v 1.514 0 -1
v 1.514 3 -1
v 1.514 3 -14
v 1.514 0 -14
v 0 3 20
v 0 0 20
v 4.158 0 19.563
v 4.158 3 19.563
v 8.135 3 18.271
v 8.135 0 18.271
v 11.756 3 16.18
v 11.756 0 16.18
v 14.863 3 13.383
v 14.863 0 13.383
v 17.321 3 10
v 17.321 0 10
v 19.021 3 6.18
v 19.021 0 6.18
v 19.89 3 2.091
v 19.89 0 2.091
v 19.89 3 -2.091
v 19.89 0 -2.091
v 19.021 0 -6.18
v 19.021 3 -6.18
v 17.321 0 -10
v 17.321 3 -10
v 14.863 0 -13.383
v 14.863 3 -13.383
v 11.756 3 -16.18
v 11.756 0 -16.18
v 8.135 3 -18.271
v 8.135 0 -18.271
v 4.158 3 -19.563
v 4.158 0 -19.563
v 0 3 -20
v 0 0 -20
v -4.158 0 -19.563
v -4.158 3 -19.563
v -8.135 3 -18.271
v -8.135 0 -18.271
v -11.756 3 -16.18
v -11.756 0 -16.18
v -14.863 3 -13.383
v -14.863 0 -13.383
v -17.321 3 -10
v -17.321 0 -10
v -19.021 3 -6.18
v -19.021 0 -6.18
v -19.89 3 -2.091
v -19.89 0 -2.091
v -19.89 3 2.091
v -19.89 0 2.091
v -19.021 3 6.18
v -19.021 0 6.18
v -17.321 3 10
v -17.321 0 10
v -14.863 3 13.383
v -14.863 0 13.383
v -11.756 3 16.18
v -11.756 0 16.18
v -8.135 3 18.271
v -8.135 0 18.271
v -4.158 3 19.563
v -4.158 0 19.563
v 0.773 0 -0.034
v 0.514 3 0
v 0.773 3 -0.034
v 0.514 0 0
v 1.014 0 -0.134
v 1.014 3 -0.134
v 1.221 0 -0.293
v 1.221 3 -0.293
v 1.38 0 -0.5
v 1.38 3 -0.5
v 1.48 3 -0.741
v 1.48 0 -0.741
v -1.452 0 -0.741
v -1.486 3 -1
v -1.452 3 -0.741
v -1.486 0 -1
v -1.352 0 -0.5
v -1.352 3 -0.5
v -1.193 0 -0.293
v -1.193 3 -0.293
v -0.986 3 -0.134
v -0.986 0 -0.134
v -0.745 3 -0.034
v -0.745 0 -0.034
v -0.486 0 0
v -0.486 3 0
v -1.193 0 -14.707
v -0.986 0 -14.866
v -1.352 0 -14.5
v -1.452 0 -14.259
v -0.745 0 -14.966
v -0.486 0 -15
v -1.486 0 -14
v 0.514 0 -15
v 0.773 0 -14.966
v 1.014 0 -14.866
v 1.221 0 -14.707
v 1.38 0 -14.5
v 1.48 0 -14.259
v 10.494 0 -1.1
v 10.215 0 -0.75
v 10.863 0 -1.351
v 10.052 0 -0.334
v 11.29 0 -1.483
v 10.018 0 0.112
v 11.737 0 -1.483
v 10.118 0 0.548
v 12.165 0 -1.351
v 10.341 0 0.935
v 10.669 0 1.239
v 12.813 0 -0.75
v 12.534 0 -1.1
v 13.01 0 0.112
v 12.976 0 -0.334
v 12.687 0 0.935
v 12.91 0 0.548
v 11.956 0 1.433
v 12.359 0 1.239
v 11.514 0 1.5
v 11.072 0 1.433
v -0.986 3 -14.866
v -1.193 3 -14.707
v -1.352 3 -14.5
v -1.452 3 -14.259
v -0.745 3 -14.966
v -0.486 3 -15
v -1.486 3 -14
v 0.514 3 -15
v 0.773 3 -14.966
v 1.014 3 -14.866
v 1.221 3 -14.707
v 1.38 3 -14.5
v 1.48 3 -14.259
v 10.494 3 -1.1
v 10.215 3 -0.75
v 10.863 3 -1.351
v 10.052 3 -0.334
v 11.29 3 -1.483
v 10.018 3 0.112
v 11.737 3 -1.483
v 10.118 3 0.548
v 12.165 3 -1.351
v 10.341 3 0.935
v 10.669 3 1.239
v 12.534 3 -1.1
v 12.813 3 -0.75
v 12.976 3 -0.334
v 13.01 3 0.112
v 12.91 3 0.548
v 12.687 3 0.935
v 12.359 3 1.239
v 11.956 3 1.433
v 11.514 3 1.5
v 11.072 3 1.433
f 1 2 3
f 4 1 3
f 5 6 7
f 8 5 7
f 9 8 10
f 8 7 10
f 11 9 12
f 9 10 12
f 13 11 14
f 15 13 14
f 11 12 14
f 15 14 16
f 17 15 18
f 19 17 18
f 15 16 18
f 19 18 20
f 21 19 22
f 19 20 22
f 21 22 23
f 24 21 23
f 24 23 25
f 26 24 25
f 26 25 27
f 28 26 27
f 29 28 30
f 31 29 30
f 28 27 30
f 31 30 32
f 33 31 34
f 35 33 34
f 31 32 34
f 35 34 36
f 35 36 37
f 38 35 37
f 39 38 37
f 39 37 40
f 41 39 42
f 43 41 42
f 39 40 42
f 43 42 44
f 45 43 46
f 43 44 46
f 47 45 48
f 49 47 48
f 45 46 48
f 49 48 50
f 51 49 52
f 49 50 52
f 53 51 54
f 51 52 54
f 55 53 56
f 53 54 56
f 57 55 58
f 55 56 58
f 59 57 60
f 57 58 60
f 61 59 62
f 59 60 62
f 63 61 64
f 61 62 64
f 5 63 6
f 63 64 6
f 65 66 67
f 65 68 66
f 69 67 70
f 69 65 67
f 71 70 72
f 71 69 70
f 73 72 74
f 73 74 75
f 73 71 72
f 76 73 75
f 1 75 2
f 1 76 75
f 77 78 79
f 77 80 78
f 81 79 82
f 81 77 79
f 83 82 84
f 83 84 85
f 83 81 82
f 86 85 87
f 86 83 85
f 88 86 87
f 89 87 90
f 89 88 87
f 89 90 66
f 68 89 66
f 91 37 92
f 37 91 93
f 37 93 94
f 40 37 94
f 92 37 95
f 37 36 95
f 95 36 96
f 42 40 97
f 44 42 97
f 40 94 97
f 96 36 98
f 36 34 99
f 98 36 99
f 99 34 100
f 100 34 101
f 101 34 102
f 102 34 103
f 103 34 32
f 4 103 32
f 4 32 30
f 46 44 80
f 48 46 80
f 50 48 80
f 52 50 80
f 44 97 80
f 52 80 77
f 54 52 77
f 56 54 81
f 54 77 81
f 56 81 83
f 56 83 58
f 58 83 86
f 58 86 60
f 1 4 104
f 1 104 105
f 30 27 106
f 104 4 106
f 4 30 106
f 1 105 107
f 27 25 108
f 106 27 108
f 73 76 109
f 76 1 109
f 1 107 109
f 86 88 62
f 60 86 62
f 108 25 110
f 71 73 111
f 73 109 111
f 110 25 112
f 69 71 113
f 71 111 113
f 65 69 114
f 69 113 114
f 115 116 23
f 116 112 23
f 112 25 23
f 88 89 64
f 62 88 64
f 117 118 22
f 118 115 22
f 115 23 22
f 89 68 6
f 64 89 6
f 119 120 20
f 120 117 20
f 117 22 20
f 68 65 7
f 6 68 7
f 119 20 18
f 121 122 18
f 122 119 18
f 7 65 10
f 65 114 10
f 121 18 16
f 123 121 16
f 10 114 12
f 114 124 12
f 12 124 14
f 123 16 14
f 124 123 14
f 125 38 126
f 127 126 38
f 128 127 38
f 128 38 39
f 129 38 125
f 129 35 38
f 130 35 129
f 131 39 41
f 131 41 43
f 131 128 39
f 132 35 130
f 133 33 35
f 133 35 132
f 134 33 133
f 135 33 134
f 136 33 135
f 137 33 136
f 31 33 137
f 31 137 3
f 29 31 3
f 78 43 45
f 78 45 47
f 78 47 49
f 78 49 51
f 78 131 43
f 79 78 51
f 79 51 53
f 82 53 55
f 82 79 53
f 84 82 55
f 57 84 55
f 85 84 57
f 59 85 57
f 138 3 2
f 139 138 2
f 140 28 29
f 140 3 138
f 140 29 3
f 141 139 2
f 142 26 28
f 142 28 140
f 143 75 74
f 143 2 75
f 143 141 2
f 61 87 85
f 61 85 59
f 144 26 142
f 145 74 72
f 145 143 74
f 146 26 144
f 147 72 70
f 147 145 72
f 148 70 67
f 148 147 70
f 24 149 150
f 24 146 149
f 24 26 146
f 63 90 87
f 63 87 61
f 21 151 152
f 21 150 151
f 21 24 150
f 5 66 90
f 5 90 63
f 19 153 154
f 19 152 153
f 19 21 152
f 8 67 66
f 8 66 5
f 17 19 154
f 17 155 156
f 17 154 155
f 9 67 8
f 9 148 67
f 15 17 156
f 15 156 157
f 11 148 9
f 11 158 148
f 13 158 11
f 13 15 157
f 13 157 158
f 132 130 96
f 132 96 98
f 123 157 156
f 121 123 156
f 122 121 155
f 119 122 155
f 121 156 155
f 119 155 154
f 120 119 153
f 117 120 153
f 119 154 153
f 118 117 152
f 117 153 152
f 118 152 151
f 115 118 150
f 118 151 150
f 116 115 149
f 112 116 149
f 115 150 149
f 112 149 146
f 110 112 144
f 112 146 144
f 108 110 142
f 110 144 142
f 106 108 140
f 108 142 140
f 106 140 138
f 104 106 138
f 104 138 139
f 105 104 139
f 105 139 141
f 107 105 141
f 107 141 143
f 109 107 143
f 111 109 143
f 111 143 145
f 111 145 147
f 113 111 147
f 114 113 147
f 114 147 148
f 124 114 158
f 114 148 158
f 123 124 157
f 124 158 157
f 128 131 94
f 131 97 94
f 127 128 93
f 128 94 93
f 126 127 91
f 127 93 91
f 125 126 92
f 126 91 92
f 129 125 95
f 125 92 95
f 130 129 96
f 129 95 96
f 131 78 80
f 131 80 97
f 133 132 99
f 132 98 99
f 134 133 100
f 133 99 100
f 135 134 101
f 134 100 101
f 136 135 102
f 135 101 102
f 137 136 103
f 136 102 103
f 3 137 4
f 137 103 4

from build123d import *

# Parameters (mm, degrees)
SKETCH1_R           = 20
BOSS_EXTRUDE1_DEPTH = 3
SKETCH2_W           = 3
SKETCH2_H           = 15
CUT_EXTRUDE1_DEPTH  = 3
SKETCH3_R           = 1.5
CUT_EXTRUDE2_DEPTH  = 3
FILLET1_R           = 1
FILLET2_R           = 1
FILLET3_R           = 1
FILLET4_R           = 1


with BuildPart() as part:
    # Sketch1 → Boss-Extrude1 (new body)
    with BuildSketch(Plane(origin=(0, 0, 0), x_dir=(1, 0, 0), z_dir=(0, 1, 0))):
        with Locations(Location((0, 0, 0), (0, 0, 270))):
            Circle(SKETCH1_R)
    extrude(amount=BOSS_EXTRUDE1_DEPTH)

    # Sketch2 → Cut-Extrude1 (cut)
    with BuildSketch(Plane(origin=(0, 3, 0), x_dir=(1, 0, 0), z_dir=(0, 1, 0))):
        with Locations((0.013912119, 7.5)):
            Rectangle(SKETCH2_W, SKETCH2_H)
    extrude(amount=-CUT_EXTRUDE1_DEPTH, mode=Mode.SUBTRACT)

    # Sketch3 → Cut-Extrude2 (cut)
    with BuildSketch(Plane(origin=(0, 3, 0), x_dir=(1, 0, 0), z_dir=(0, 1, 0))):
        with Locations(Location((11.513912119, 0, 0), (0, 0, 270))):
            Circle(SKETCH3_R)
    extrude(amount=-CUT_EXTRUDE2_DEPTH, mode=Mode.SUBTRACT)

    # Fillet1
    fillet1_edges = [part.edges().sort_by_distance(p)[0] for p in [
        (-1.486087881, 1.5, -15),
    ]]
    fillet(fillet1_edges, radius=FILLET1_R)

    # Fillet2
    fillet2_edges = [part.edges().sort_by_distance(p)[0] for p in [
        (1.513912119, 1.5, -15),
    ]]
    fillet(fillet2_edges, radius=FILLET2_R)

    # Fillet3
    fillet3_edges = [part.edges().sort_by_distance(p)[0] for p in [
        (-1.486087881, 1.5, 0),
    ]]
    fillet(fillet3_edges, radius=FILLET3_R)

    # Fillet4
    fillet4_edges = [part.edges().sort_by_distance(p)[0] for p in [
        (1.513912119, 1.5, 0),
    ]]
    fillet(fillet4_edges, radius=FILLET4_R)


solid = part.part
